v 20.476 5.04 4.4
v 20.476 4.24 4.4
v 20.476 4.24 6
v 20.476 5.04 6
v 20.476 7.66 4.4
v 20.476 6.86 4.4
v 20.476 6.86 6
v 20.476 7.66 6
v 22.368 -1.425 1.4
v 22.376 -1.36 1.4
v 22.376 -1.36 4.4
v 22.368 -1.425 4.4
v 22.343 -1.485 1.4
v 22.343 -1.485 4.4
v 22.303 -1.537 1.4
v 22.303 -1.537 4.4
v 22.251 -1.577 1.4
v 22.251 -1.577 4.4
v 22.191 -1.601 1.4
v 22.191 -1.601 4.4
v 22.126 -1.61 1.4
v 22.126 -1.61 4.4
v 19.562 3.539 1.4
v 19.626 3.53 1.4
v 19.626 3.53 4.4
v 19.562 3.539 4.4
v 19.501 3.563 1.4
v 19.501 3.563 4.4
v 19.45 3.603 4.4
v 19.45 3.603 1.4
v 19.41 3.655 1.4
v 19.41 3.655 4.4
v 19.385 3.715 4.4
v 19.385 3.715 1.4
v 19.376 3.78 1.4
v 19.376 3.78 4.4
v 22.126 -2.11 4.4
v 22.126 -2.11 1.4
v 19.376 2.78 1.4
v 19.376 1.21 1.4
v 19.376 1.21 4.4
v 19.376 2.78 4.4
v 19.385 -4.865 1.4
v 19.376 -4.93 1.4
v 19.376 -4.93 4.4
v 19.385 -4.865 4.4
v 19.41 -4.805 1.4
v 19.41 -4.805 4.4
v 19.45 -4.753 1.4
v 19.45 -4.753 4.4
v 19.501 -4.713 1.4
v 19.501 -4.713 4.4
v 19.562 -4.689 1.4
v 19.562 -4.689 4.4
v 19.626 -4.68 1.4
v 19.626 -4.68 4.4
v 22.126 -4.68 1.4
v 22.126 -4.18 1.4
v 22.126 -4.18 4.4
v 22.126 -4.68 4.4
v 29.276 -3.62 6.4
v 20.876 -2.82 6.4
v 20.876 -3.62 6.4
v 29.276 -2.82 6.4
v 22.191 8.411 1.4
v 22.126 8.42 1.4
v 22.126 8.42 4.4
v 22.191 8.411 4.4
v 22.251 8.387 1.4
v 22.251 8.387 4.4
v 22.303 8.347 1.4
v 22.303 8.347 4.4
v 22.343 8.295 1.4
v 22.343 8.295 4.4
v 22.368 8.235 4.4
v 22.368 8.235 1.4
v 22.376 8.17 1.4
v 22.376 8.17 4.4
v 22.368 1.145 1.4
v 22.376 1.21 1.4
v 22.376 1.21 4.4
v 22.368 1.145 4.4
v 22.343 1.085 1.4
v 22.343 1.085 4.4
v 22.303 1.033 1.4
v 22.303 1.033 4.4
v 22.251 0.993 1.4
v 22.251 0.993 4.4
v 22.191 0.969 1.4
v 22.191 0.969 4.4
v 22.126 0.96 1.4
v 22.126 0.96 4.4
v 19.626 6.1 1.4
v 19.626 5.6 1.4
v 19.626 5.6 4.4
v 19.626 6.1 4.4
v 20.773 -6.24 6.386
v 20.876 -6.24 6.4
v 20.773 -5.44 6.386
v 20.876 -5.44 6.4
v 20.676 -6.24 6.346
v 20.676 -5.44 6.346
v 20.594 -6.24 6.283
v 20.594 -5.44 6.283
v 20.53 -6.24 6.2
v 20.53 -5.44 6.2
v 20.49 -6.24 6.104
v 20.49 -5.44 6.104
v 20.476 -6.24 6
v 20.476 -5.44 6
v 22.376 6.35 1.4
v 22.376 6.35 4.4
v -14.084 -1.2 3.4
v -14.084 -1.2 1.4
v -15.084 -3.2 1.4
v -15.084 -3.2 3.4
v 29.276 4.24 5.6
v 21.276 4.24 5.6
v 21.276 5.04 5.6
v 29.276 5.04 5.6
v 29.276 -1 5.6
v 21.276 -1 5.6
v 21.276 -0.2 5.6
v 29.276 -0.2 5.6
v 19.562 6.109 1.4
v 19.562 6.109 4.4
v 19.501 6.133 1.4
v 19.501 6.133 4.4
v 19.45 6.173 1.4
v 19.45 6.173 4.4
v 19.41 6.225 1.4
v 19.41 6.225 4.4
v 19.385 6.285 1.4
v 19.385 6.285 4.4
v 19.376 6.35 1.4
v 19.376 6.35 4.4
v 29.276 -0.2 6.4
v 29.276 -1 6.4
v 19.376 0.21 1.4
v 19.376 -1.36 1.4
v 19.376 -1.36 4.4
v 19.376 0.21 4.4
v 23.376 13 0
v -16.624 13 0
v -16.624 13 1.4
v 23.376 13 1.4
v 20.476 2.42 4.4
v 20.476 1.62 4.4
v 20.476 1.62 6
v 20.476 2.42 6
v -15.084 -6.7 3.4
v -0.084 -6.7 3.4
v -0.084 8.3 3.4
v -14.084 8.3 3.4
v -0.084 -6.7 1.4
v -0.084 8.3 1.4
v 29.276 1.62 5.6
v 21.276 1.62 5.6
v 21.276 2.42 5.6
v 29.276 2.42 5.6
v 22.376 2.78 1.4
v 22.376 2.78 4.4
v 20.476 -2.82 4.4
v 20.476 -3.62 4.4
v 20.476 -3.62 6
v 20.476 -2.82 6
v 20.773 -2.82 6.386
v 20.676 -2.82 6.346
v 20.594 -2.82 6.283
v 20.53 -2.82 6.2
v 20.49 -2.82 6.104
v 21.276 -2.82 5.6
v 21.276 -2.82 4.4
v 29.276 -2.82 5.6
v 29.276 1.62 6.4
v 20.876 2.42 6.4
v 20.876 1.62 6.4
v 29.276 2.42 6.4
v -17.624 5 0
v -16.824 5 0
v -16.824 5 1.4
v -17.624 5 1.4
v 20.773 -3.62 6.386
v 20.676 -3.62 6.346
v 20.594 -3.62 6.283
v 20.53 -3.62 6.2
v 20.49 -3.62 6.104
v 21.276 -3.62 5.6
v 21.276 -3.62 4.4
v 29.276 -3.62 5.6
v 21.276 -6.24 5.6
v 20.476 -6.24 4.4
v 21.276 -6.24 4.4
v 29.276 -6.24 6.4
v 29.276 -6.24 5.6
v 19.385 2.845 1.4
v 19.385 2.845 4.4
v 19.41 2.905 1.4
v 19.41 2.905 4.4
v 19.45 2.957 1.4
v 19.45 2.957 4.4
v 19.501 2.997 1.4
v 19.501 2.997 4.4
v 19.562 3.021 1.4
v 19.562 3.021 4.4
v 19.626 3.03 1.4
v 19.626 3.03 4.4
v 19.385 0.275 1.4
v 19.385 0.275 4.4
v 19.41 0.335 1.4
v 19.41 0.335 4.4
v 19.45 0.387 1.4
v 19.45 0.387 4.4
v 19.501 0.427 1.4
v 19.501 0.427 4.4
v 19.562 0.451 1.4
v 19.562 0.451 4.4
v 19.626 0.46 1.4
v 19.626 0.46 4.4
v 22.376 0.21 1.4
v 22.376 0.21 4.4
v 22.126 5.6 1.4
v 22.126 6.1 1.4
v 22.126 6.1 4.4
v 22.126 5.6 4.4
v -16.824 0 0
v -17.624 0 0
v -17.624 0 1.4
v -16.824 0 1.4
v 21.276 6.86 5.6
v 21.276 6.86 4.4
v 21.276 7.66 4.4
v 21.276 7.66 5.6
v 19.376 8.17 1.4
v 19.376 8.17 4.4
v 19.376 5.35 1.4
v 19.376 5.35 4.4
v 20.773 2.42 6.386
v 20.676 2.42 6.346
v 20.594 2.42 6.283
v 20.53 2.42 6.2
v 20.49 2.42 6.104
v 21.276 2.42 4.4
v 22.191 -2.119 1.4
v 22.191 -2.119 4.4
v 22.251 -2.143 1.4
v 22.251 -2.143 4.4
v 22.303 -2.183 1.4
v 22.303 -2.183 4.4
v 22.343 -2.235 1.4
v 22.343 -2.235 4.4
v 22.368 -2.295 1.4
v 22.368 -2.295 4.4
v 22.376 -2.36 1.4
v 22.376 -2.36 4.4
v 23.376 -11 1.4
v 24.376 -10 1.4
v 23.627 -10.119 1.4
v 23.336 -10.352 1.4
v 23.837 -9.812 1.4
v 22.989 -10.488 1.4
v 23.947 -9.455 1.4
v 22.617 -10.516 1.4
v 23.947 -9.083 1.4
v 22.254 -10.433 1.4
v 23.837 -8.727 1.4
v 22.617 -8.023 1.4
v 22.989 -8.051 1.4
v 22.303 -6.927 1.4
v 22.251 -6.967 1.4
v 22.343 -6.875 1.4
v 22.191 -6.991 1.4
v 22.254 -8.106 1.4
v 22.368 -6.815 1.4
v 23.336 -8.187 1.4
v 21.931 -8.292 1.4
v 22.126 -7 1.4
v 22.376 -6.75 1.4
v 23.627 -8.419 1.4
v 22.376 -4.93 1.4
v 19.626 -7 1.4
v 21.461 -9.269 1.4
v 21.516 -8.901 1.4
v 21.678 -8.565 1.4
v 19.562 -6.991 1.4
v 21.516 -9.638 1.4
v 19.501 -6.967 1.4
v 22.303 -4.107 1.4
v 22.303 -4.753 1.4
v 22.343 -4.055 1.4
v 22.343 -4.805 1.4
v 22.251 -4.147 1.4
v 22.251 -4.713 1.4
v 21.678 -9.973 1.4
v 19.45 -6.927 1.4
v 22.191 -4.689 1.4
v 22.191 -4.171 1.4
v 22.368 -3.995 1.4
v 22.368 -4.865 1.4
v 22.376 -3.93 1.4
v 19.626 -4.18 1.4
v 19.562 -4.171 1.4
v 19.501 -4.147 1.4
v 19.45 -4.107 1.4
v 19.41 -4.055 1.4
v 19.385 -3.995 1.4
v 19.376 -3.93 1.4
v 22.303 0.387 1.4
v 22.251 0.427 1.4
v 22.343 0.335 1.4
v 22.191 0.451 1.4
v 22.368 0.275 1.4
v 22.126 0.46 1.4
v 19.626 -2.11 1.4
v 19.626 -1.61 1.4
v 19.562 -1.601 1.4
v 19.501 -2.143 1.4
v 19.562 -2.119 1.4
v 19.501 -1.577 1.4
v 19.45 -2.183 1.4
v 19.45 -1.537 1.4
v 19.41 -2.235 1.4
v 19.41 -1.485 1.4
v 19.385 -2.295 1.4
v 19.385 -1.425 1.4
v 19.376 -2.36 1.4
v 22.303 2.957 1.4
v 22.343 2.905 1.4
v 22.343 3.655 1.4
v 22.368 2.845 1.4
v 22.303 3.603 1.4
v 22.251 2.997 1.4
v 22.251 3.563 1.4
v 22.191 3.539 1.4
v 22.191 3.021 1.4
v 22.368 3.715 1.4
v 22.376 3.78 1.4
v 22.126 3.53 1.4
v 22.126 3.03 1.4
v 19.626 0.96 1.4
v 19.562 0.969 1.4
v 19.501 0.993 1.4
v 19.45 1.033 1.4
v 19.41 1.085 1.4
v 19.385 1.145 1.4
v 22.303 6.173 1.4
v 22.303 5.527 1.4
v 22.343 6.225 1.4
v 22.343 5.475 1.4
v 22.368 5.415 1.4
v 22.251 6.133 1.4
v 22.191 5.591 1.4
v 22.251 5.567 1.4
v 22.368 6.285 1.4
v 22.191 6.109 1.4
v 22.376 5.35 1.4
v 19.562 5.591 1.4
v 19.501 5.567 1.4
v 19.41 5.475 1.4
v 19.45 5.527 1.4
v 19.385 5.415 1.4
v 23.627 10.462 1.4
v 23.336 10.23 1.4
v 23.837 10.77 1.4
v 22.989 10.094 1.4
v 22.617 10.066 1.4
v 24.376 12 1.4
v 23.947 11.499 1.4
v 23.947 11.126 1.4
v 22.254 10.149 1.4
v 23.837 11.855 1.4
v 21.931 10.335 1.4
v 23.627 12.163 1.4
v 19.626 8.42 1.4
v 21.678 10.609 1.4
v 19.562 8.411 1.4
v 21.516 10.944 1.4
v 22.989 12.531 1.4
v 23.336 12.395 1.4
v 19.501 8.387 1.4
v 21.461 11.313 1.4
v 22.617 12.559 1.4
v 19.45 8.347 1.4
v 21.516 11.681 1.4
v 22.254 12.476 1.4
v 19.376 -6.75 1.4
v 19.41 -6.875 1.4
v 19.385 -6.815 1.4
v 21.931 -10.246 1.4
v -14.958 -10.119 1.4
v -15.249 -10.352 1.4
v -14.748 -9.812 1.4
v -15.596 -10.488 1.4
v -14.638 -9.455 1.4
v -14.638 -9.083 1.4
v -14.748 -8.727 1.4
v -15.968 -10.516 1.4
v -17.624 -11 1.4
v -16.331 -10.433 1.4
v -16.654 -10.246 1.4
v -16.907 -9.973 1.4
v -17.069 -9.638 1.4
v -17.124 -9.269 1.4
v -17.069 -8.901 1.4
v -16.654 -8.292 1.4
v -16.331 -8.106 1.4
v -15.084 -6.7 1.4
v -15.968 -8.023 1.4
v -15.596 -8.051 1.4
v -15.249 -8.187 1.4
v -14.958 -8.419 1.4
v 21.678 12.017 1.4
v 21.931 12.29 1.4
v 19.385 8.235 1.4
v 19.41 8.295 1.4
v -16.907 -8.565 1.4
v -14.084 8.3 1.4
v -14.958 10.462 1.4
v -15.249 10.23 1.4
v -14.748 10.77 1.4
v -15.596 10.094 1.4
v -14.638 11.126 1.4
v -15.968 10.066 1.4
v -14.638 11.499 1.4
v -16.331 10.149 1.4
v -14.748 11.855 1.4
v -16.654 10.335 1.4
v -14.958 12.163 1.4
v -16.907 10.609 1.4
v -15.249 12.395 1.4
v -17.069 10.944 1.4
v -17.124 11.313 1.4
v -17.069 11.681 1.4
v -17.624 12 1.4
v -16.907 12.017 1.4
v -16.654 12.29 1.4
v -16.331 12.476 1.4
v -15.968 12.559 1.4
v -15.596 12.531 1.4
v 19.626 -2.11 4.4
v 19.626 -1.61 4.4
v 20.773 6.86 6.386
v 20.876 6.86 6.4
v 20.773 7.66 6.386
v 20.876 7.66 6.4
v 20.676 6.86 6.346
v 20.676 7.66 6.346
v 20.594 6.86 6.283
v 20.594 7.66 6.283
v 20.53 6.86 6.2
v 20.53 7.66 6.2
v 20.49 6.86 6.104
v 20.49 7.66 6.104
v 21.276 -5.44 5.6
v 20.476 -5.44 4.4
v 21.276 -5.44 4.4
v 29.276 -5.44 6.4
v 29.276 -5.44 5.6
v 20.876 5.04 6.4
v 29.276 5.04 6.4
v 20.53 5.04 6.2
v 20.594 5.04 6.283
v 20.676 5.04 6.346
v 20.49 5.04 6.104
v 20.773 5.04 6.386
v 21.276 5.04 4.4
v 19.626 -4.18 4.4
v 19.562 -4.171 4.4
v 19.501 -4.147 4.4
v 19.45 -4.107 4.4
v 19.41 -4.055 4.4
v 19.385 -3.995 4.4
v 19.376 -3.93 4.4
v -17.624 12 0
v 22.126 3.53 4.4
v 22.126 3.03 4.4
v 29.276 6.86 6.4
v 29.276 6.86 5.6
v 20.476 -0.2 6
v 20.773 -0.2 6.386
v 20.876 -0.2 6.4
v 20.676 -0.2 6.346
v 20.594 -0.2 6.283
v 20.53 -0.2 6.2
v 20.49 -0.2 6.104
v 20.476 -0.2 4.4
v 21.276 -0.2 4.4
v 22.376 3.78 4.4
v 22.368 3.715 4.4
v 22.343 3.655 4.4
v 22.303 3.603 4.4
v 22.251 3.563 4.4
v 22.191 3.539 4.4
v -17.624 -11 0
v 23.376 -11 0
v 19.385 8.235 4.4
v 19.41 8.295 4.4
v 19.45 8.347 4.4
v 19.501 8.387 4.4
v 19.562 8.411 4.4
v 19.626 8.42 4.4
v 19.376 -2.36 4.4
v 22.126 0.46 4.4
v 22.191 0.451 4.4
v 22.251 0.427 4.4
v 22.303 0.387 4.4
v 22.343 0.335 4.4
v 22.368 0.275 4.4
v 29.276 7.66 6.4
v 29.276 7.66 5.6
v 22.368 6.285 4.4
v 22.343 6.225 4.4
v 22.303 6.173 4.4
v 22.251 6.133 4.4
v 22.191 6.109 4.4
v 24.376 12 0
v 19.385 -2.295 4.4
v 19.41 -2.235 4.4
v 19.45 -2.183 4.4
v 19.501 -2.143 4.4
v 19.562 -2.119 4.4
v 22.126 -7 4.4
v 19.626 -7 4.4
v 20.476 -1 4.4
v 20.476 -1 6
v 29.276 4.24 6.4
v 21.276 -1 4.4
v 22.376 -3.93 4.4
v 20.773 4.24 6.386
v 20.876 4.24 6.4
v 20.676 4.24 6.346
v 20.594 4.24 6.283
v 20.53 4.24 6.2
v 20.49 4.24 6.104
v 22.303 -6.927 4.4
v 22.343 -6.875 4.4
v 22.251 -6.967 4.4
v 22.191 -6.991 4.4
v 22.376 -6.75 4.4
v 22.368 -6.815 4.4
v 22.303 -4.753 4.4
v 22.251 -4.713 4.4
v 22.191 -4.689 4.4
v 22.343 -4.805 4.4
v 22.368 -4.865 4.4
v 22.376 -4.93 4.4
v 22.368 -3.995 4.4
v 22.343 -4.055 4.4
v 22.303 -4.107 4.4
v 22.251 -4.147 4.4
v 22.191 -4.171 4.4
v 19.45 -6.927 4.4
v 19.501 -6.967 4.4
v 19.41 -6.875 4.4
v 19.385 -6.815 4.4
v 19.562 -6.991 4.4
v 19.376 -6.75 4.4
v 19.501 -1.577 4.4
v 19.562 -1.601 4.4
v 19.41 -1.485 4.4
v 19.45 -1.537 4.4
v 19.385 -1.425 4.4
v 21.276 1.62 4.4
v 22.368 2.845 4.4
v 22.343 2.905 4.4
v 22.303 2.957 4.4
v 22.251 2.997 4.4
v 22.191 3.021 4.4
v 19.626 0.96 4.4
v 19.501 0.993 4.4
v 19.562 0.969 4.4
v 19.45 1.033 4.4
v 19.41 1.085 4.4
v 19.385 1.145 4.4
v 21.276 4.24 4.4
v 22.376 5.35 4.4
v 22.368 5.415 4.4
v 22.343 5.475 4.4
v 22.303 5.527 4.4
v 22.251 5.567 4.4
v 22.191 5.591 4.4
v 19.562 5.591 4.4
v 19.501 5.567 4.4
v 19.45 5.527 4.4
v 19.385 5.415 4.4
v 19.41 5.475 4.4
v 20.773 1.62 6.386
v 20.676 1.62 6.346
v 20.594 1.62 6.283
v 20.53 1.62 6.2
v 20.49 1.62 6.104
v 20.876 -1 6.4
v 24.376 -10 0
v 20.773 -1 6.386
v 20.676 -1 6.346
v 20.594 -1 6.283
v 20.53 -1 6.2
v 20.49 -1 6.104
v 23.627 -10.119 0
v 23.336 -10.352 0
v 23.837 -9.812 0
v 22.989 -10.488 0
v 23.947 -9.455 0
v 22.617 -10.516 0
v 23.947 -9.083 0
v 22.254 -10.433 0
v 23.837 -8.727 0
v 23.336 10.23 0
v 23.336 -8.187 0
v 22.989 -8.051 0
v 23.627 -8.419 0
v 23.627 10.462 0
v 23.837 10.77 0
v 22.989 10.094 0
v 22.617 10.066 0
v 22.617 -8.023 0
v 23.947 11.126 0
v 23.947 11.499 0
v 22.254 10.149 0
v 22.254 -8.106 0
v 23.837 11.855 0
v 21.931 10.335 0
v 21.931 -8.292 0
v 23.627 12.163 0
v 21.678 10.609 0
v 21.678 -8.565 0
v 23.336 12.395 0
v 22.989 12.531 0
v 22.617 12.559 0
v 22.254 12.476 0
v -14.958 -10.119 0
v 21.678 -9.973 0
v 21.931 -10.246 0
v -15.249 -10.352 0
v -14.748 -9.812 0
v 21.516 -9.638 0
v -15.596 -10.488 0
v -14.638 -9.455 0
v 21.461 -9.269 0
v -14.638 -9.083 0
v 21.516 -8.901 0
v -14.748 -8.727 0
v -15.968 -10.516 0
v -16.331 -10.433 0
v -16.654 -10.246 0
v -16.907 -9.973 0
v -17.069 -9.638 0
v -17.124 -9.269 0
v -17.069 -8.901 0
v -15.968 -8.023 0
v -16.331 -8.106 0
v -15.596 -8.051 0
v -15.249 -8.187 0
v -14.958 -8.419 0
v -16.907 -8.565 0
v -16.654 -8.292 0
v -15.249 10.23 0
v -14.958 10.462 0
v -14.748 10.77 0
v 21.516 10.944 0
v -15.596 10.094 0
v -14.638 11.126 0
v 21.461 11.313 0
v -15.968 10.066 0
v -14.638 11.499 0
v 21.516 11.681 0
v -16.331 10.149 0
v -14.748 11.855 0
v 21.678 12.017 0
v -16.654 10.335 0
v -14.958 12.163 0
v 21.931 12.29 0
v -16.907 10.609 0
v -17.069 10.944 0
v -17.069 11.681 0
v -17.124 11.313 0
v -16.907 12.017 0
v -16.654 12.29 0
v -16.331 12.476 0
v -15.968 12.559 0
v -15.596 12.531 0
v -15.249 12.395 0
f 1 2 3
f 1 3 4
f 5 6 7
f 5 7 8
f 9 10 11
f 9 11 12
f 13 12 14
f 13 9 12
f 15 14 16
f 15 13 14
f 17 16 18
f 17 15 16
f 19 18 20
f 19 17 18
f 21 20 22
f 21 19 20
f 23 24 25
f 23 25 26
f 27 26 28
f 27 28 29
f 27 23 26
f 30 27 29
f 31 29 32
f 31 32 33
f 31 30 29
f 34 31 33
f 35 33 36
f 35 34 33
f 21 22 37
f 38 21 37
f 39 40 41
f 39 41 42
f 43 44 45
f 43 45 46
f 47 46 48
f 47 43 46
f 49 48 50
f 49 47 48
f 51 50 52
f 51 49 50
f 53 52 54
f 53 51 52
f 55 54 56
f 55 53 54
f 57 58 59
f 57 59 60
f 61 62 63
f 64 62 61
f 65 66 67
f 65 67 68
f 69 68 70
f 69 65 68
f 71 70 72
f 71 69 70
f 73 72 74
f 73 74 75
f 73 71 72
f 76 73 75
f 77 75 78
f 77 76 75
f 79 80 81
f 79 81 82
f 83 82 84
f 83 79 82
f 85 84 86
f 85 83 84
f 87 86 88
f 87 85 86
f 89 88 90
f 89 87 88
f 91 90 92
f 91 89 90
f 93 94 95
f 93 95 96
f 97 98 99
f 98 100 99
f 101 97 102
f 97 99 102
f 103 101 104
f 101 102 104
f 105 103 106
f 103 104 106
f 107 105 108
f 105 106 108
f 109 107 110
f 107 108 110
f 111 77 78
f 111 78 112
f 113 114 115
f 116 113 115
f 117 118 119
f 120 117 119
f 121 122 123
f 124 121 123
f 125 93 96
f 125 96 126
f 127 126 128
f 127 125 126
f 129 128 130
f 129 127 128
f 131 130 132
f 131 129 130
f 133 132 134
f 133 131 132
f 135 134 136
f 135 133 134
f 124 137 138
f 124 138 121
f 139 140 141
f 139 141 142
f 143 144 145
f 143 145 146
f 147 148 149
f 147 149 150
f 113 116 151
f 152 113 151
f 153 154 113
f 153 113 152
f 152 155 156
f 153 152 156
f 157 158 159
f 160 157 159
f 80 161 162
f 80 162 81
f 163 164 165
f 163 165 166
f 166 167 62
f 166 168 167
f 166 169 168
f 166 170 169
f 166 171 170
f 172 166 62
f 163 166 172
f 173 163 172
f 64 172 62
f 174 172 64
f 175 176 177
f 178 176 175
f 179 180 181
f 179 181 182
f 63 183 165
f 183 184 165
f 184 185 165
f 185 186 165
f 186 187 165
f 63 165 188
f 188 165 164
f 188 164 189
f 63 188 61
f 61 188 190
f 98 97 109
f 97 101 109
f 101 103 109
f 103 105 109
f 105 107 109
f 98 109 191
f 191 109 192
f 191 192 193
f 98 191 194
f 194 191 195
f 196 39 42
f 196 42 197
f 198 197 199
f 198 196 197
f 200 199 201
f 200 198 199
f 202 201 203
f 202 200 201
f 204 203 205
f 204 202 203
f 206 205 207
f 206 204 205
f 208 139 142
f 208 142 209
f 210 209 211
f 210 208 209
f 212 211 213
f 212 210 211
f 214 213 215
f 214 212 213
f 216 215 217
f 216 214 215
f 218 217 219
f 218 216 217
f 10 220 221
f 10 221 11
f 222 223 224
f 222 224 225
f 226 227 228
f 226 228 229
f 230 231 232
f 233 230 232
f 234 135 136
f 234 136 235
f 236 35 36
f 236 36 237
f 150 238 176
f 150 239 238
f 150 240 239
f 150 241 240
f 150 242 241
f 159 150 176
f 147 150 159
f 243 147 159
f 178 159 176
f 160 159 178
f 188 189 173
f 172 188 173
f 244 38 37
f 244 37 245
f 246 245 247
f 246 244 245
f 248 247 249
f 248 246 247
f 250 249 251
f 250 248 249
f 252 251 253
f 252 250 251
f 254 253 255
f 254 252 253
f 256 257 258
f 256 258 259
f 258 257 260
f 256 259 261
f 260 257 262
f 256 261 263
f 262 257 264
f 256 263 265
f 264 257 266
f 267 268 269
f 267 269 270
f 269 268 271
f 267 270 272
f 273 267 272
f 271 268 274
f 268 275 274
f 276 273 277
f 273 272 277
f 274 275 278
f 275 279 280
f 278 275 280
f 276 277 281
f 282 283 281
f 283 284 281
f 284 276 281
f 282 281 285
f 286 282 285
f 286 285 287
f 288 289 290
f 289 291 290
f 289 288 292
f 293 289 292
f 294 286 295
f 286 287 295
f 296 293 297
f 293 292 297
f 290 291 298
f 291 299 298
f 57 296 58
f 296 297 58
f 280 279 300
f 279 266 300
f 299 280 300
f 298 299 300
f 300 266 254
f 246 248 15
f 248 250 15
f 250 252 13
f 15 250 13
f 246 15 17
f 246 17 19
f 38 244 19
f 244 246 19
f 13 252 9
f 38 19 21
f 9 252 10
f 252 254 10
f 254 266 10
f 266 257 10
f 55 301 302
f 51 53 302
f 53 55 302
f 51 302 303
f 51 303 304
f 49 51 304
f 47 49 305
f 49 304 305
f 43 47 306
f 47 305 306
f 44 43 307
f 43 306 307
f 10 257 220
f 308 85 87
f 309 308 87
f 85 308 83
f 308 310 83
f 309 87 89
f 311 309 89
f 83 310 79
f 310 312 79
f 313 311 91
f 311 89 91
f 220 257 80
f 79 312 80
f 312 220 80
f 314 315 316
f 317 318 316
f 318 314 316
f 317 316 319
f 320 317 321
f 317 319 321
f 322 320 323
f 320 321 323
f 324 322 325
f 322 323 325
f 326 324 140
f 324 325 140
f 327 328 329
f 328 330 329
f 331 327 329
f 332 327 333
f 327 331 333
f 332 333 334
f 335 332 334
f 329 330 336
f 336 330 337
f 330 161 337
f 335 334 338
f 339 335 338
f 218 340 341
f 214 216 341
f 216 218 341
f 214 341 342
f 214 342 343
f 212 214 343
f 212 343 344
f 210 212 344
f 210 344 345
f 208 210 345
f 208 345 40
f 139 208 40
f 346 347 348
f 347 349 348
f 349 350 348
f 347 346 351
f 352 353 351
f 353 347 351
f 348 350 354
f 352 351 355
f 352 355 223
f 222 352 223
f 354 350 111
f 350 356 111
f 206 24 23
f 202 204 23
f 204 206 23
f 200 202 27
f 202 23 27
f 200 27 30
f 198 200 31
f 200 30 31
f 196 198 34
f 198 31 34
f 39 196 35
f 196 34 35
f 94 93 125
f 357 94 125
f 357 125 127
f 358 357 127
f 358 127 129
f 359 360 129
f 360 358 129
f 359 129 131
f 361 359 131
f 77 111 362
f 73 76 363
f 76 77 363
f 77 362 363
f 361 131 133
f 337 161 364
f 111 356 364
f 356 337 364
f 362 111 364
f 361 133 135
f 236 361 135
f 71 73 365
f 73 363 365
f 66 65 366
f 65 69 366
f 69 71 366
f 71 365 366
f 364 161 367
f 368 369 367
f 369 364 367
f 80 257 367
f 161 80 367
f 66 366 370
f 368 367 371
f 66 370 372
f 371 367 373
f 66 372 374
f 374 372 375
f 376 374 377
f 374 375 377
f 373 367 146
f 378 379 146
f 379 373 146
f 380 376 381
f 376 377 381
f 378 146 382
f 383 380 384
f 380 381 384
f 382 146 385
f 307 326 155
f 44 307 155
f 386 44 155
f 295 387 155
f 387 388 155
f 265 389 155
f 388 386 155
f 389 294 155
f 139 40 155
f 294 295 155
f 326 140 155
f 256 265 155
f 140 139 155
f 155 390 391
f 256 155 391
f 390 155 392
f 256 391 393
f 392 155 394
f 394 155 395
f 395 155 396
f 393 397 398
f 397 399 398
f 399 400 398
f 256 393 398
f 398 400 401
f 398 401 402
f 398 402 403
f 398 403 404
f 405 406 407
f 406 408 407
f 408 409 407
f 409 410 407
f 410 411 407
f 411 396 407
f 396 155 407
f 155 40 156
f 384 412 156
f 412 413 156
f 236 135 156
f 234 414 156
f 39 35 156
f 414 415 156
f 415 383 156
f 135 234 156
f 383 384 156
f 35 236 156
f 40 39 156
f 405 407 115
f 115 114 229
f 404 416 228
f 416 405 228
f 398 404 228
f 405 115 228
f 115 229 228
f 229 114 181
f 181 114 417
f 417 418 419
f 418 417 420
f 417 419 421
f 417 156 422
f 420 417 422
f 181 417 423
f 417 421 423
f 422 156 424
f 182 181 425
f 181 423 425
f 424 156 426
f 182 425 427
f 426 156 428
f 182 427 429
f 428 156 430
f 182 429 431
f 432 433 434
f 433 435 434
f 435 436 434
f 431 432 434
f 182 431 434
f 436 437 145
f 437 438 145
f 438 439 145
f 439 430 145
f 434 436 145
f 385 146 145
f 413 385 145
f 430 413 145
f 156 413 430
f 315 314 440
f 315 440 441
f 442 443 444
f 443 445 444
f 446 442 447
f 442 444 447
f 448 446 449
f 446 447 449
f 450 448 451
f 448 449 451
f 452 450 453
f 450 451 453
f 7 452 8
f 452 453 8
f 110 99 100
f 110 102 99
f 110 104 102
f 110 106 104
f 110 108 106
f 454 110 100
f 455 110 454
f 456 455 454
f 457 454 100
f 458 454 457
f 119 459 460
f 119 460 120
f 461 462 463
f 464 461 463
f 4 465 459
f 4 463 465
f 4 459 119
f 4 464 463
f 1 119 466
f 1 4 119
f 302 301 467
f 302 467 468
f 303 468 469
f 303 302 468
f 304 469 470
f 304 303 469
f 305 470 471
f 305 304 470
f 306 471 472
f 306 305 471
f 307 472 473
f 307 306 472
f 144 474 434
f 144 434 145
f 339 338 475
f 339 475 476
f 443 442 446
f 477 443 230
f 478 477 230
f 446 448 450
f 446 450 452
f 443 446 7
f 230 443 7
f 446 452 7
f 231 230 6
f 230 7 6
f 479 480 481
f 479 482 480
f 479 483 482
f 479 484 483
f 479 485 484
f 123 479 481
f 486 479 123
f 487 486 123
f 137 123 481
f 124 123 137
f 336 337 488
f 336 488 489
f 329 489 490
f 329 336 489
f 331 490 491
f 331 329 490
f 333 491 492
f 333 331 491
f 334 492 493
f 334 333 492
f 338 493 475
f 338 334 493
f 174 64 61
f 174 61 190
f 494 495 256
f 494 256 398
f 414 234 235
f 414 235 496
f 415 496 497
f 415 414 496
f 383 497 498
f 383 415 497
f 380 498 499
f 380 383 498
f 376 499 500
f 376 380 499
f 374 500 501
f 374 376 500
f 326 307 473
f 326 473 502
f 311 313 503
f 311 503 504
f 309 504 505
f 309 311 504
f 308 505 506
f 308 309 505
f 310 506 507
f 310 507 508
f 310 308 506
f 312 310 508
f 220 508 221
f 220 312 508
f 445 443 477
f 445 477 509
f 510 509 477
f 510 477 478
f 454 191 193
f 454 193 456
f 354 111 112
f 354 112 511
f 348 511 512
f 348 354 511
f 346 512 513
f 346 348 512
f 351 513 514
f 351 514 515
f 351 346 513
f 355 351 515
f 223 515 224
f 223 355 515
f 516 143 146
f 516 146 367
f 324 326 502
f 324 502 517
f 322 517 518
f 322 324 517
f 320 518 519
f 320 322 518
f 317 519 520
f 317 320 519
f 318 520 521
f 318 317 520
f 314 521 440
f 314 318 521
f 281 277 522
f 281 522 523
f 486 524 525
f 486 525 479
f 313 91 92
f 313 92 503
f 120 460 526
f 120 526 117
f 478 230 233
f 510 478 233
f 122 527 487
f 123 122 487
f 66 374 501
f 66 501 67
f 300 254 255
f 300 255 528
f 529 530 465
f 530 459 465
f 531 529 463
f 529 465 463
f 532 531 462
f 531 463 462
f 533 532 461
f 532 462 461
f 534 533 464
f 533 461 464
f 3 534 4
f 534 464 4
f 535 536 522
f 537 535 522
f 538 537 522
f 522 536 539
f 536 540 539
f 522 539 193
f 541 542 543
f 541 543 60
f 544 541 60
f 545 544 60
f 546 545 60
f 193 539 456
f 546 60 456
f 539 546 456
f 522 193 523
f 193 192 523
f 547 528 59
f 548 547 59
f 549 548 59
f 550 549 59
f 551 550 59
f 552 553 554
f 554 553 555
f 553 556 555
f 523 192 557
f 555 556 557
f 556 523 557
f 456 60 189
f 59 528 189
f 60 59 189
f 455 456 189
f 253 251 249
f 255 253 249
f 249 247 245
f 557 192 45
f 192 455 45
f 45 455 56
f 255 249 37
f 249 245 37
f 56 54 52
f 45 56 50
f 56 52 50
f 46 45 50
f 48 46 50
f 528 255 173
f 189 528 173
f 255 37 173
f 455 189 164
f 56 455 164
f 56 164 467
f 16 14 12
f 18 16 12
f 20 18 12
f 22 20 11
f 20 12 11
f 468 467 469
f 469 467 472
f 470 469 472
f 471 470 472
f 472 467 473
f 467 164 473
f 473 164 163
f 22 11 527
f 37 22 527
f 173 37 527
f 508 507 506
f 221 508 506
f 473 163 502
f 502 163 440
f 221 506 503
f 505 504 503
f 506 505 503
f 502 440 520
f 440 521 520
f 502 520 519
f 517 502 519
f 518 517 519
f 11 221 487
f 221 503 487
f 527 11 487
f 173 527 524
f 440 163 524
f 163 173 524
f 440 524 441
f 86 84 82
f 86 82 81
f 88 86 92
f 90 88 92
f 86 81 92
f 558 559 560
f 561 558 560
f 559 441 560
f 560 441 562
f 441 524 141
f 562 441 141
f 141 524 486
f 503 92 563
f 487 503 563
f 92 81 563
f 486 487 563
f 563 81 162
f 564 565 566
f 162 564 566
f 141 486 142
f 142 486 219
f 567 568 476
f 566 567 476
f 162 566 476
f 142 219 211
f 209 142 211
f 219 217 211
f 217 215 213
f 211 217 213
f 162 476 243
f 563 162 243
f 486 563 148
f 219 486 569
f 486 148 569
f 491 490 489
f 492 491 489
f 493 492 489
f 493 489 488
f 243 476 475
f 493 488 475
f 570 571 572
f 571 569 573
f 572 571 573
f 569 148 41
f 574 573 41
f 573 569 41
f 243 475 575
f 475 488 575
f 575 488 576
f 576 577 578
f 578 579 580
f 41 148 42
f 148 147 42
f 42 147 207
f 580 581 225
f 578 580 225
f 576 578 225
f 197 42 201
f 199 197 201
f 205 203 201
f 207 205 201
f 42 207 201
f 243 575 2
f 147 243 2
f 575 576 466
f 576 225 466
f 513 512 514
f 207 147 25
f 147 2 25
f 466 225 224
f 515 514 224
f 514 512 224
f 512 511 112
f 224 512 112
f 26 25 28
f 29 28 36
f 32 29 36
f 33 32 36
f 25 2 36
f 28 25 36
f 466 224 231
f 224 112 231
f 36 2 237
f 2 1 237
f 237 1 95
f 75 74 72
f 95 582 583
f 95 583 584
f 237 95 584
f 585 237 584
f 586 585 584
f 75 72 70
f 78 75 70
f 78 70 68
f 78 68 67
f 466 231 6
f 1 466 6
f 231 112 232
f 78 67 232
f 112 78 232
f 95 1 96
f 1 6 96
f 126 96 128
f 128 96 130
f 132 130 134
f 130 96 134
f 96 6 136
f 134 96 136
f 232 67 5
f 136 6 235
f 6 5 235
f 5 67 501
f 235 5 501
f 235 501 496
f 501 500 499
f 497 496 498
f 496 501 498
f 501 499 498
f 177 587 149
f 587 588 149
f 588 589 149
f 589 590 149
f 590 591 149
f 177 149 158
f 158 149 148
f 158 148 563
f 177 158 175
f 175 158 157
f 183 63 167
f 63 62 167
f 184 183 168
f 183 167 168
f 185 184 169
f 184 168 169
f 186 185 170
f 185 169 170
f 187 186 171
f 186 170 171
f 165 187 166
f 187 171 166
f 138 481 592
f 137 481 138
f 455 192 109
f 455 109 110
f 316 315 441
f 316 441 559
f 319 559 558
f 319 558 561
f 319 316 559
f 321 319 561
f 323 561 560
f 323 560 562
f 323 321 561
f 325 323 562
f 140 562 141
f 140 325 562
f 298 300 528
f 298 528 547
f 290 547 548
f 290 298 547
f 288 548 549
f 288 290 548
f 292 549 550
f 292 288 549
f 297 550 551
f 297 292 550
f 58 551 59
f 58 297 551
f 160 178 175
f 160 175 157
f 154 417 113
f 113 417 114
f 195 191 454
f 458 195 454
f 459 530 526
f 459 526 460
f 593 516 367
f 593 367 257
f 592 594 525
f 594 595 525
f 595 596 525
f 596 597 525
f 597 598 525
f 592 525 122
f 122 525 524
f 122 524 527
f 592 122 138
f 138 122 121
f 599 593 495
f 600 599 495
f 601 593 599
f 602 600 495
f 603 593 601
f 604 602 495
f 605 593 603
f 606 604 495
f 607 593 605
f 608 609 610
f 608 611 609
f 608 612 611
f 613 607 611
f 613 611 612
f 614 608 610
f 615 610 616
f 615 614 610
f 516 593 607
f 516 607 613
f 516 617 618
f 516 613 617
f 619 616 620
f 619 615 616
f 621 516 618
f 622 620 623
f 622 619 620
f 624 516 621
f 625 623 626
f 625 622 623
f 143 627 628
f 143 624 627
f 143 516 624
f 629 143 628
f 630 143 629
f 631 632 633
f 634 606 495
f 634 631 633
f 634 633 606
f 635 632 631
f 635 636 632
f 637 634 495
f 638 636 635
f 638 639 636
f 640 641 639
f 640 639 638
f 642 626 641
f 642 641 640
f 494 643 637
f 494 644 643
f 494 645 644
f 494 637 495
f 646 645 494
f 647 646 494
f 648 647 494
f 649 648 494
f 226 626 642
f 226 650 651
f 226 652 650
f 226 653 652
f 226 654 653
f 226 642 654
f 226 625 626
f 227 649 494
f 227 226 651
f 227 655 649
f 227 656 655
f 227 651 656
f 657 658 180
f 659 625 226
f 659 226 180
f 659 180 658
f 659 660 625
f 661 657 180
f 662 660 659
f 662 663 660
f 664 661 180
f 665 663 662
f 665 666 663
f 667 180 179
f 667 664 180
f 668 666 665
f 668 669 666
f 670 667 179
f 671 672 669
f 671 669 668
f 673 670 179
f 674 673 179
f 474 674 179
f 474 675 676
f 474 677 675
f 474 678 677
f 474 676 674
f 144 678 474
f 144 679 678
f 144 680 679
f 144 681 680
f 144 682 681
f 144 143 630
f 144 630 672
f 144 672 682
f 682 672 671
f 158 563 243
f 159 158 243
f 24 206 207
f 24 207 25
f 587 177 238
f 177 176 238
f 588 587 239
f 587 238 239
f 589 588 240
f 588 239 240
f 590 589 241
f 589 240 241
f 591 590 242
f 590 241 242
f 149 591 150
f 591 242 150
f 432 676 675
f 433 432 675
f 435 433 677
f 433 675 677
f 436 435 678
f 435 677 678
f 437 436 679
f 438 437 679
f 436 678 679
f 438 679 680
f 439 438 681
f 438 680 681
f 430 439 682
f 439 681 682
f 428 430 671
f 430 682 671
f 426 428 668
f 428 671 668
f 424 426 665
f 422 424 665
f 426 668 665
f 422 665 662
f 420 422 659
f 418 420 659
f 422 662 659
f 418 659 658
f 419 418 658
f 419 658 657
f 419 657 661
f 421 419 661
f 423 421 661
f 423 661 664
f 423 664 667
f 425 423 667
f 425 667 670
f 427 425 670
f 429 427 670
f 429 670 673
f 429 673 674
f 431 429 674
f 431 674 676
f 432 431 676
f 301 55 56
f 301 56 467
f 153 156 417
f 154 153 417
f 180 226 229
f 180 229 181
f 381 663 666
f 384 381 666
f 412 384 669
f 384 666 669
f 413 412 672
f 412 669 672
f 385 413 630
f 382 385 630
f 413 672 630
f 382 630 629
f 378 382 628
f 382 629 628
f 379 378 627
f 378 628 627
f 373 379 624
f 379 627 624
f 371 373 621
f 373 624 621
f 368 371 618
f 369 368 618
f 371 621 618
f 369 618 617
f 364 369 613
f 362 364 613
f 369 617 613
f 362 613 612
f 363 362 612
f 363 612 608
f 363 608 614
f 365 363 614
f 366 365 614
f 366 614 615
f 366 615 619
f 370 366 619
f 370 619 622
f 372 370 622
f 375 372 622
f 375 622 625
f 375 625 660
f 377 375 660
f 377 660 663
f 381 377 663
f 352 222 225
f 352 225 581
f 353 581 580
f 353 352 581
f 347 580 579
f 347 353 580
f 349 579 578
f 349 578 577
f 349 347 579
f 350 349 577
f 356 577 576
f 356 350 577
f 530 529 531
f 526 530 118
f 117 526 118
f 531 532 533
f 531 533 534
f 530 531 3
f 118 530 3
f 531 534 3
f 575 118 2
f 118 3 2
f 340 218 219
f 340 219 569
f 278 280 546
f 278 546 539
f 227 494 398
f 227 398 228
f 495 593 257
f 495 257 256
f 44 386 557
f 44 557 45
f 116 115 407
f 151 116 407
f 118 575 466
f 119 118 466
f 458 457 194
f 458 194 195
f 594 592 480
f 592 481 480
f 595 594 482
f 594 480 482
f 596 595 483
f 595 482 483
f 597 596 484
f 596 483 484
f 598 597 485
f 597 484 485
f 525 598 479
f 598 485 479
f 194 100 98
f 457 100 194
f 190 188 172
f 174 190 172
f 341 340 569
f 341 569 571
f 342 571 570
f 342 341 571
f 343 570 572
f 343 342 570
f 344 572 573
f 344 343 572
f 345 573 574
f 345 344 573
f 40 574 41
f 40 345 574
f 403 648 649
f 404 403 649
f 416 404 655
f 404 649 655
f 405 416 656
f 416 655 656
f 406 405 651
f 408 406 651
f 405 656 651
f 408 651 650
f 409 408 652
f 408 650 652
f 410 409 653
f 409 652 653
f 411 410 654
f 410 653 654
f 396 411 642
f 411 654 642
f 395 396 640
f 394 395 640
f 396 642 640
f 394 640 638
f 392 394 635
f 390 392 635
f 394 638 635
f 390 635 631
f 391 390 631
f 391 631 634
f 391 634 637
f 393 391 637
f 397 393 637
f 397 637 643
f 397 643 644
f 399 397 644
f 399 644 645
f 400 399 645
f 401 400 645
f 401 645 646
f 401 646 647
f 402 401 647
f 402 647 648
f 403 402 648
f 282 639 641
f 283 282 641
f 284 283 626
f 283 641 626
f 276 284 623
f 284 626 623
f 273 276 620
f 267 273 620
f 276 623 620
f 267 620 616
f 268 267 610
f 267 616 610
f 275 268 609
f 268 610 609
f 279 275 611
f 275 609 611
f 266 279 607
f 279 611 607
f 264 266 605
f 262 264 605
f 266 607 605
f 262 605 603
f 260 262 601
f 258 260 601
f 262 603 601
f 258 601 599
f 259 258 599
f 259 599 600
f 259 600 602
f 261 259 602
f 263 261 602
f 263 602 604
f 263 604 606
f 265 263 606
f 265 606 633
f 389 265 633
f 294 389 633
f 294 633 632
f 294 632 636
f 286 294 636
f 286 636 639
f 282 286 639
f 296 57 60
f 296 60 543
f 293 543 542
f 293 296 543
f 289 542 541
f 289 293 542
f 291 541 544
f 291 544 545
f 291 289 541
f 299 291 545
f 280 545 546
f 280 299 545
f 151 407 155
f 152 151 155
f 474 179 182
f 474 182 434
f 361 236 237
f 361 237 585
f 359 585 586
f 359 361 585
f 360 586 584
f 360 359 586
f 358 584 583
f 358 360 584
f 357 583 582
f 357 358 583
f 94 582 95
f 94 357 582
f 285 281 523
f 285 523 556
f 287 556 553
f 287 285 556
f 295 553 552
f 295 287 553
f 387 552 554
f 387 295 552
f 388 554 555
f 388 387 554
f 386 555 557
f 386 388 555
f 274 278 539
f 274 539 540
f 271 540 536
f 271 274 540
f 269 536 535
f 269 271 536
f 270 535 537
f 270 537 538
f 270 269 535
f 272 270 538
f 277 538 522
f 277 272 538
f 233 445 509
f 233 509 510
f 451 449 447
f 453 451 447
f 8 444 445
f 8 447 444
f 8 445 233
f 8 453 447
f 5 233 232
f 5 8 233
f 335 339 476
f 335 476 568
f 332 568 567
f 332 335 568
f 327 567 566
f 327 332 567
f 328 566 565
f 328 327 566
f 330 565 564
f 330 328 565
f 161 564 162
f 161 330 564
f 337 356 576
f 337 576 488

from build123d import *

# Parameters (mm, degrees)
BOSS_EXTRUDE1_DEPTH        = 1.4
F_2_5_2_5_DIAMETER_SLOT1_D = 2.5
BOSS_EXTRUDE2_DEPTH        = 2
BOSS_EXTRUDE3_DEPTH        = 3
SKETCH8_W                  = 0.8
SKETCH8_H                  = 0.8
BOSS_EXTRUDE4_DEPTH        = 2
SKETCH9_W                  = 0.8
SKETCH9_H                  = 0.8
BOSS_EXTRUDE5_DEPTH        = 8
LPATTERN1_COUNT            = 6
LPATTERN1_PITCH            = 2.62
FILLET1_R                  = 0.4


with BuildPart() as part:
    # Sketch1 → Boss-Extrude1 (new body)
    with BuildSketch(Plane.XY):
        Polygon((-17.623529412, 12), (-16.623529412, 13), (23.376470588, 13), (24.376470588, 12), (24.376470588, -10), (23.376470588, -11), (-17.623529412, -11), (-17.623529412, 0), (-16.823529412, 0), (-16.823529412, 5), (-17.623529412, 5), align=None)
    extrude(amount=BOSS_EXTRUDE1_DEPTH)

    # Ø2.5 (2.5) Diameter Slot1 (through all)
    with Locations(Plane.XY.offset(1.4)):
        with Locations((-15.874285672, -9.269193445), (-15.874285672, 11.312714255), (22.710754066, -9.269193445), (22.710754066, 11.312714255)):
            Hole(F_2_5_2_5_DIAMETER_SLOT1_D / 2)

    # Sketch6 → Boss-Extrude2 (add)
    with BuildSketch(Plane.XY.offset(1.4)):
        Polygon((-15.083529412, -6.7), (-0.083529412, -6.7), (-0.083529412, 8.3), (-14.083529412, 8.3), (-14.083529412, -1.2), (-15.083529412, -3.2), align=None)
    extrude(amount=BOSS_EXTRUDE2_DEPTH)

    # Sketch7 → Boss-Extrude3 (add)
    with BuildSketch(Plane.XY.offset(1.4)):
        with BuildLine():
            Line((22.126470588, 6.1), (22.126470588, 5.6))
            ThreePointArc((22.126470588, 5.6), (22.303247284, 5.526776695), (22.376470588, 5.35))
            Line((22.376470588, 5.35), (22.376470588, 3.78))
            ThreePointArc((22.376470588, 3.78), (22.303247284, 3.603223305), (22.126470588, 3.53))
            Line((22.126470588, 3.53), (22.126470588, 3.03))
            ThreePointArc((22.126470588, 3.03), (22.303247284, 2.956776695), (22.376470588, 2.78))
            Line((22.376470588, 2.78), (22.376470588, 1.21))
            ThreePointArc((22.376470588, 1.21), (22.303247284, 1.033223305), (22.126470588, 0.96))
            Line((22.126470588, 0.96), (22.126470588, 0.46))
            ThreePointArc((22.126470588, 0.46), (22.303247284, 0.386776695), (22.376470588, 0.21))
            Line((22.376470588, 0.21), (22.376470588, -1.36))
            ThreePointArc((22.376470588, -1.36), (22.303247284, -1.536776695), (22.126470588, -1.61))
            Line((22.126470588, -1.61), (22.126470588, -2.11))
            ThreePointArc((22.126470588, -2.11), (22.303247284, -2.183223305), (22.376470588, -2.36))
            Line((22.376470588, -2.36), (22.376470588, -3.93))
            ThreePointArc((22.376470588, -3.93), (22.303247284, -4.106776695), (22.126470588, -4.18))
            Line((22.126470588, -4.18), (22.126470588, -4.68))
            ThreePointArc((22.126470588, -4.68), (22.303247284, -4.753223305), (22.376470588, -4.93))
            Line((22.376470588, -4.93), (22.376470588, -6.75))
            ThreePointArc((22.376470588, -6.75), (22.303247284, -6.926776695), (22.126470588, -7))
            Line((22.126470588, -7), (19.626470588, -7))
            ThreePointArc((19.626470588, -7), (19.449693893, -6.926776695), (19.376470588, -6.75))
            Line((19.376470588, -6.75), (19.376470588, -4.93))
            ThreePointArc((19.376470588, -4.93), (19.449693893, -4.753223305), (19.626470588, -4.68))
            Line((19.626470588, -4.68), (19.626470588, -4.18))
            ThreePointArc((19.626470588, -4.18), (19.449693893, -4.106776695), (19.376470588, -3.93))
            Line((19.376470588, -3.93), (19.376470588, -2.36))
            ThreePointArc((19.376470588, -2.36), (19.449693893, -2.183223305), (19.626470588, -2.11))
            Line((19.626470588, -2.11), (19.626470588, -1.61))
            ThreePointArc((19.626470588, -1.61), (19.449693893, -1.536776695), (19.376470588, -1.36))
            Line((19.376470588, -1.36), (19.376470588, 0.21))
            ThreePointArc((19.376470588, 0.21), (19.449693893, 0.386776695), (19.626470588, 0.46))
            Line((19.626470588, 0.46), (19.626470588, 0.96))
            ThreePointArc((19.626470588, 0.96), (19.449693893, 1.033223305), (19.376470588, 1.21))
            Line((19.376470588, 1.21), (19.376470588, 2.78))
            ThreePointArc((19.376470588, 2.78), (19.449693893, 2.956776695), (19.626470588, 3.03))
            Line((19.626470588, 3.03), (19.626470588, 3.53))
            ThreePointArc((19.626470588, 3.53), (19.449693893, 3.603223305), (19.376470588, 3.78))
            Line((19.376470588, 3.78), (19.376470588, 5.35))
            ThreePointArc((19.376470588, 5.35), (19.449693893, 5.526776695), (19.626470588, 5.6))
            Line((19.626470588, 5.6), (19.626470588, 6.1))
            ThreePointArc((19.626470588, 6.1), (19.449693893, 6.173223305), (19.376470588, 6.35))
            Line((19.376470588, 6.35), (19.376470588, 8.17))
            ThreePointArc((19.376470588, 8.17), (19.449693893, 8.346776695), (19.626470588, 8.42))
            Line((19.626470588, 8.42), (22.126470588, 8.42))
            ThreePointArc((22.126470588, 8.42), (22.303247284, 8.346776695), (22.376470588, 8.17))
            Line((22.376470588, 8.17), (22.376470588, 6.35))
            ThreePointArc((22.376470588, 6.35), (22.303247284, 6.173223305), (22.126470588, 6.1))
        make_face()
    extrude(amount=BOSS_EXTRUDE3_DEPTH)

    # Sketch8 → Boss-Extrude4 (add)
    with BuildSketch(Plane.XY.offset(4.4)):
        with Locations((20.876470588, -5.84)):
            Rectangle(SKETCH8_W, SKETCH8_H)
        with Locations((20.876470588, -3.22)):
            Rectangle(SKETCH8_W, SKETCH8_H)
        with Locations((20.876470588, -0.6)):
            Rectangle(SKETCH8_W, SKETCH8_H)
        with Locations((20.876470588, 2.02)):
            Rectangle(SKETCH8_W, SKETCH8_H)
        with Locations((20.876470588, 4.64)):
            Rectangle(SKETCH8_W, SKETCH8_H)
        with Locations((20.876470588, 7.26)):
            Rectangle(SKETCH8_W, SKETCH8_H)
    extrude(amount=BOSS_EXTRUDE4_DEPTH)

    # Sketch9 → Boss-Extrude5 (add)
    with BuildSketch(Plane(origin=(21.276470588, 0, 0), x_dir=(0, 0, -1), z_dir=(1, 0, 0))):
        with Locations((-6, 7.26)):
            Rectangle(SKETCH9_W, SKETCH9_H)
    boss_extrude5 = extrude(amount=BOSS_EXTRUDE5_DEPTH)

    # LPattern1: Boss-Extrude5 ×6
    with Locations(*[(0, -i * LPATTERN1_PITCH, 0) for i in range(1, LPATTERN1_COUNT)]):
        add(boss_extrude5)

    # Fillet1
    fillet1_edges = [part.edges().sort_by_distance(p)[0] for p in [
        (20.476470588, -5.84, 6.4),
        (20.476470588, -3.22, 6.4),
        (20.476470588, -0.6, 6.4),
        (20.476470588, 2.02, 6.4),
        (20.476470588, 4.64, 6.4),
        (20.476470588, 7.26, 6.4),
    ]]
    fillet(fillet1_edges, radius=FILLET1_R)


solid = part.part
